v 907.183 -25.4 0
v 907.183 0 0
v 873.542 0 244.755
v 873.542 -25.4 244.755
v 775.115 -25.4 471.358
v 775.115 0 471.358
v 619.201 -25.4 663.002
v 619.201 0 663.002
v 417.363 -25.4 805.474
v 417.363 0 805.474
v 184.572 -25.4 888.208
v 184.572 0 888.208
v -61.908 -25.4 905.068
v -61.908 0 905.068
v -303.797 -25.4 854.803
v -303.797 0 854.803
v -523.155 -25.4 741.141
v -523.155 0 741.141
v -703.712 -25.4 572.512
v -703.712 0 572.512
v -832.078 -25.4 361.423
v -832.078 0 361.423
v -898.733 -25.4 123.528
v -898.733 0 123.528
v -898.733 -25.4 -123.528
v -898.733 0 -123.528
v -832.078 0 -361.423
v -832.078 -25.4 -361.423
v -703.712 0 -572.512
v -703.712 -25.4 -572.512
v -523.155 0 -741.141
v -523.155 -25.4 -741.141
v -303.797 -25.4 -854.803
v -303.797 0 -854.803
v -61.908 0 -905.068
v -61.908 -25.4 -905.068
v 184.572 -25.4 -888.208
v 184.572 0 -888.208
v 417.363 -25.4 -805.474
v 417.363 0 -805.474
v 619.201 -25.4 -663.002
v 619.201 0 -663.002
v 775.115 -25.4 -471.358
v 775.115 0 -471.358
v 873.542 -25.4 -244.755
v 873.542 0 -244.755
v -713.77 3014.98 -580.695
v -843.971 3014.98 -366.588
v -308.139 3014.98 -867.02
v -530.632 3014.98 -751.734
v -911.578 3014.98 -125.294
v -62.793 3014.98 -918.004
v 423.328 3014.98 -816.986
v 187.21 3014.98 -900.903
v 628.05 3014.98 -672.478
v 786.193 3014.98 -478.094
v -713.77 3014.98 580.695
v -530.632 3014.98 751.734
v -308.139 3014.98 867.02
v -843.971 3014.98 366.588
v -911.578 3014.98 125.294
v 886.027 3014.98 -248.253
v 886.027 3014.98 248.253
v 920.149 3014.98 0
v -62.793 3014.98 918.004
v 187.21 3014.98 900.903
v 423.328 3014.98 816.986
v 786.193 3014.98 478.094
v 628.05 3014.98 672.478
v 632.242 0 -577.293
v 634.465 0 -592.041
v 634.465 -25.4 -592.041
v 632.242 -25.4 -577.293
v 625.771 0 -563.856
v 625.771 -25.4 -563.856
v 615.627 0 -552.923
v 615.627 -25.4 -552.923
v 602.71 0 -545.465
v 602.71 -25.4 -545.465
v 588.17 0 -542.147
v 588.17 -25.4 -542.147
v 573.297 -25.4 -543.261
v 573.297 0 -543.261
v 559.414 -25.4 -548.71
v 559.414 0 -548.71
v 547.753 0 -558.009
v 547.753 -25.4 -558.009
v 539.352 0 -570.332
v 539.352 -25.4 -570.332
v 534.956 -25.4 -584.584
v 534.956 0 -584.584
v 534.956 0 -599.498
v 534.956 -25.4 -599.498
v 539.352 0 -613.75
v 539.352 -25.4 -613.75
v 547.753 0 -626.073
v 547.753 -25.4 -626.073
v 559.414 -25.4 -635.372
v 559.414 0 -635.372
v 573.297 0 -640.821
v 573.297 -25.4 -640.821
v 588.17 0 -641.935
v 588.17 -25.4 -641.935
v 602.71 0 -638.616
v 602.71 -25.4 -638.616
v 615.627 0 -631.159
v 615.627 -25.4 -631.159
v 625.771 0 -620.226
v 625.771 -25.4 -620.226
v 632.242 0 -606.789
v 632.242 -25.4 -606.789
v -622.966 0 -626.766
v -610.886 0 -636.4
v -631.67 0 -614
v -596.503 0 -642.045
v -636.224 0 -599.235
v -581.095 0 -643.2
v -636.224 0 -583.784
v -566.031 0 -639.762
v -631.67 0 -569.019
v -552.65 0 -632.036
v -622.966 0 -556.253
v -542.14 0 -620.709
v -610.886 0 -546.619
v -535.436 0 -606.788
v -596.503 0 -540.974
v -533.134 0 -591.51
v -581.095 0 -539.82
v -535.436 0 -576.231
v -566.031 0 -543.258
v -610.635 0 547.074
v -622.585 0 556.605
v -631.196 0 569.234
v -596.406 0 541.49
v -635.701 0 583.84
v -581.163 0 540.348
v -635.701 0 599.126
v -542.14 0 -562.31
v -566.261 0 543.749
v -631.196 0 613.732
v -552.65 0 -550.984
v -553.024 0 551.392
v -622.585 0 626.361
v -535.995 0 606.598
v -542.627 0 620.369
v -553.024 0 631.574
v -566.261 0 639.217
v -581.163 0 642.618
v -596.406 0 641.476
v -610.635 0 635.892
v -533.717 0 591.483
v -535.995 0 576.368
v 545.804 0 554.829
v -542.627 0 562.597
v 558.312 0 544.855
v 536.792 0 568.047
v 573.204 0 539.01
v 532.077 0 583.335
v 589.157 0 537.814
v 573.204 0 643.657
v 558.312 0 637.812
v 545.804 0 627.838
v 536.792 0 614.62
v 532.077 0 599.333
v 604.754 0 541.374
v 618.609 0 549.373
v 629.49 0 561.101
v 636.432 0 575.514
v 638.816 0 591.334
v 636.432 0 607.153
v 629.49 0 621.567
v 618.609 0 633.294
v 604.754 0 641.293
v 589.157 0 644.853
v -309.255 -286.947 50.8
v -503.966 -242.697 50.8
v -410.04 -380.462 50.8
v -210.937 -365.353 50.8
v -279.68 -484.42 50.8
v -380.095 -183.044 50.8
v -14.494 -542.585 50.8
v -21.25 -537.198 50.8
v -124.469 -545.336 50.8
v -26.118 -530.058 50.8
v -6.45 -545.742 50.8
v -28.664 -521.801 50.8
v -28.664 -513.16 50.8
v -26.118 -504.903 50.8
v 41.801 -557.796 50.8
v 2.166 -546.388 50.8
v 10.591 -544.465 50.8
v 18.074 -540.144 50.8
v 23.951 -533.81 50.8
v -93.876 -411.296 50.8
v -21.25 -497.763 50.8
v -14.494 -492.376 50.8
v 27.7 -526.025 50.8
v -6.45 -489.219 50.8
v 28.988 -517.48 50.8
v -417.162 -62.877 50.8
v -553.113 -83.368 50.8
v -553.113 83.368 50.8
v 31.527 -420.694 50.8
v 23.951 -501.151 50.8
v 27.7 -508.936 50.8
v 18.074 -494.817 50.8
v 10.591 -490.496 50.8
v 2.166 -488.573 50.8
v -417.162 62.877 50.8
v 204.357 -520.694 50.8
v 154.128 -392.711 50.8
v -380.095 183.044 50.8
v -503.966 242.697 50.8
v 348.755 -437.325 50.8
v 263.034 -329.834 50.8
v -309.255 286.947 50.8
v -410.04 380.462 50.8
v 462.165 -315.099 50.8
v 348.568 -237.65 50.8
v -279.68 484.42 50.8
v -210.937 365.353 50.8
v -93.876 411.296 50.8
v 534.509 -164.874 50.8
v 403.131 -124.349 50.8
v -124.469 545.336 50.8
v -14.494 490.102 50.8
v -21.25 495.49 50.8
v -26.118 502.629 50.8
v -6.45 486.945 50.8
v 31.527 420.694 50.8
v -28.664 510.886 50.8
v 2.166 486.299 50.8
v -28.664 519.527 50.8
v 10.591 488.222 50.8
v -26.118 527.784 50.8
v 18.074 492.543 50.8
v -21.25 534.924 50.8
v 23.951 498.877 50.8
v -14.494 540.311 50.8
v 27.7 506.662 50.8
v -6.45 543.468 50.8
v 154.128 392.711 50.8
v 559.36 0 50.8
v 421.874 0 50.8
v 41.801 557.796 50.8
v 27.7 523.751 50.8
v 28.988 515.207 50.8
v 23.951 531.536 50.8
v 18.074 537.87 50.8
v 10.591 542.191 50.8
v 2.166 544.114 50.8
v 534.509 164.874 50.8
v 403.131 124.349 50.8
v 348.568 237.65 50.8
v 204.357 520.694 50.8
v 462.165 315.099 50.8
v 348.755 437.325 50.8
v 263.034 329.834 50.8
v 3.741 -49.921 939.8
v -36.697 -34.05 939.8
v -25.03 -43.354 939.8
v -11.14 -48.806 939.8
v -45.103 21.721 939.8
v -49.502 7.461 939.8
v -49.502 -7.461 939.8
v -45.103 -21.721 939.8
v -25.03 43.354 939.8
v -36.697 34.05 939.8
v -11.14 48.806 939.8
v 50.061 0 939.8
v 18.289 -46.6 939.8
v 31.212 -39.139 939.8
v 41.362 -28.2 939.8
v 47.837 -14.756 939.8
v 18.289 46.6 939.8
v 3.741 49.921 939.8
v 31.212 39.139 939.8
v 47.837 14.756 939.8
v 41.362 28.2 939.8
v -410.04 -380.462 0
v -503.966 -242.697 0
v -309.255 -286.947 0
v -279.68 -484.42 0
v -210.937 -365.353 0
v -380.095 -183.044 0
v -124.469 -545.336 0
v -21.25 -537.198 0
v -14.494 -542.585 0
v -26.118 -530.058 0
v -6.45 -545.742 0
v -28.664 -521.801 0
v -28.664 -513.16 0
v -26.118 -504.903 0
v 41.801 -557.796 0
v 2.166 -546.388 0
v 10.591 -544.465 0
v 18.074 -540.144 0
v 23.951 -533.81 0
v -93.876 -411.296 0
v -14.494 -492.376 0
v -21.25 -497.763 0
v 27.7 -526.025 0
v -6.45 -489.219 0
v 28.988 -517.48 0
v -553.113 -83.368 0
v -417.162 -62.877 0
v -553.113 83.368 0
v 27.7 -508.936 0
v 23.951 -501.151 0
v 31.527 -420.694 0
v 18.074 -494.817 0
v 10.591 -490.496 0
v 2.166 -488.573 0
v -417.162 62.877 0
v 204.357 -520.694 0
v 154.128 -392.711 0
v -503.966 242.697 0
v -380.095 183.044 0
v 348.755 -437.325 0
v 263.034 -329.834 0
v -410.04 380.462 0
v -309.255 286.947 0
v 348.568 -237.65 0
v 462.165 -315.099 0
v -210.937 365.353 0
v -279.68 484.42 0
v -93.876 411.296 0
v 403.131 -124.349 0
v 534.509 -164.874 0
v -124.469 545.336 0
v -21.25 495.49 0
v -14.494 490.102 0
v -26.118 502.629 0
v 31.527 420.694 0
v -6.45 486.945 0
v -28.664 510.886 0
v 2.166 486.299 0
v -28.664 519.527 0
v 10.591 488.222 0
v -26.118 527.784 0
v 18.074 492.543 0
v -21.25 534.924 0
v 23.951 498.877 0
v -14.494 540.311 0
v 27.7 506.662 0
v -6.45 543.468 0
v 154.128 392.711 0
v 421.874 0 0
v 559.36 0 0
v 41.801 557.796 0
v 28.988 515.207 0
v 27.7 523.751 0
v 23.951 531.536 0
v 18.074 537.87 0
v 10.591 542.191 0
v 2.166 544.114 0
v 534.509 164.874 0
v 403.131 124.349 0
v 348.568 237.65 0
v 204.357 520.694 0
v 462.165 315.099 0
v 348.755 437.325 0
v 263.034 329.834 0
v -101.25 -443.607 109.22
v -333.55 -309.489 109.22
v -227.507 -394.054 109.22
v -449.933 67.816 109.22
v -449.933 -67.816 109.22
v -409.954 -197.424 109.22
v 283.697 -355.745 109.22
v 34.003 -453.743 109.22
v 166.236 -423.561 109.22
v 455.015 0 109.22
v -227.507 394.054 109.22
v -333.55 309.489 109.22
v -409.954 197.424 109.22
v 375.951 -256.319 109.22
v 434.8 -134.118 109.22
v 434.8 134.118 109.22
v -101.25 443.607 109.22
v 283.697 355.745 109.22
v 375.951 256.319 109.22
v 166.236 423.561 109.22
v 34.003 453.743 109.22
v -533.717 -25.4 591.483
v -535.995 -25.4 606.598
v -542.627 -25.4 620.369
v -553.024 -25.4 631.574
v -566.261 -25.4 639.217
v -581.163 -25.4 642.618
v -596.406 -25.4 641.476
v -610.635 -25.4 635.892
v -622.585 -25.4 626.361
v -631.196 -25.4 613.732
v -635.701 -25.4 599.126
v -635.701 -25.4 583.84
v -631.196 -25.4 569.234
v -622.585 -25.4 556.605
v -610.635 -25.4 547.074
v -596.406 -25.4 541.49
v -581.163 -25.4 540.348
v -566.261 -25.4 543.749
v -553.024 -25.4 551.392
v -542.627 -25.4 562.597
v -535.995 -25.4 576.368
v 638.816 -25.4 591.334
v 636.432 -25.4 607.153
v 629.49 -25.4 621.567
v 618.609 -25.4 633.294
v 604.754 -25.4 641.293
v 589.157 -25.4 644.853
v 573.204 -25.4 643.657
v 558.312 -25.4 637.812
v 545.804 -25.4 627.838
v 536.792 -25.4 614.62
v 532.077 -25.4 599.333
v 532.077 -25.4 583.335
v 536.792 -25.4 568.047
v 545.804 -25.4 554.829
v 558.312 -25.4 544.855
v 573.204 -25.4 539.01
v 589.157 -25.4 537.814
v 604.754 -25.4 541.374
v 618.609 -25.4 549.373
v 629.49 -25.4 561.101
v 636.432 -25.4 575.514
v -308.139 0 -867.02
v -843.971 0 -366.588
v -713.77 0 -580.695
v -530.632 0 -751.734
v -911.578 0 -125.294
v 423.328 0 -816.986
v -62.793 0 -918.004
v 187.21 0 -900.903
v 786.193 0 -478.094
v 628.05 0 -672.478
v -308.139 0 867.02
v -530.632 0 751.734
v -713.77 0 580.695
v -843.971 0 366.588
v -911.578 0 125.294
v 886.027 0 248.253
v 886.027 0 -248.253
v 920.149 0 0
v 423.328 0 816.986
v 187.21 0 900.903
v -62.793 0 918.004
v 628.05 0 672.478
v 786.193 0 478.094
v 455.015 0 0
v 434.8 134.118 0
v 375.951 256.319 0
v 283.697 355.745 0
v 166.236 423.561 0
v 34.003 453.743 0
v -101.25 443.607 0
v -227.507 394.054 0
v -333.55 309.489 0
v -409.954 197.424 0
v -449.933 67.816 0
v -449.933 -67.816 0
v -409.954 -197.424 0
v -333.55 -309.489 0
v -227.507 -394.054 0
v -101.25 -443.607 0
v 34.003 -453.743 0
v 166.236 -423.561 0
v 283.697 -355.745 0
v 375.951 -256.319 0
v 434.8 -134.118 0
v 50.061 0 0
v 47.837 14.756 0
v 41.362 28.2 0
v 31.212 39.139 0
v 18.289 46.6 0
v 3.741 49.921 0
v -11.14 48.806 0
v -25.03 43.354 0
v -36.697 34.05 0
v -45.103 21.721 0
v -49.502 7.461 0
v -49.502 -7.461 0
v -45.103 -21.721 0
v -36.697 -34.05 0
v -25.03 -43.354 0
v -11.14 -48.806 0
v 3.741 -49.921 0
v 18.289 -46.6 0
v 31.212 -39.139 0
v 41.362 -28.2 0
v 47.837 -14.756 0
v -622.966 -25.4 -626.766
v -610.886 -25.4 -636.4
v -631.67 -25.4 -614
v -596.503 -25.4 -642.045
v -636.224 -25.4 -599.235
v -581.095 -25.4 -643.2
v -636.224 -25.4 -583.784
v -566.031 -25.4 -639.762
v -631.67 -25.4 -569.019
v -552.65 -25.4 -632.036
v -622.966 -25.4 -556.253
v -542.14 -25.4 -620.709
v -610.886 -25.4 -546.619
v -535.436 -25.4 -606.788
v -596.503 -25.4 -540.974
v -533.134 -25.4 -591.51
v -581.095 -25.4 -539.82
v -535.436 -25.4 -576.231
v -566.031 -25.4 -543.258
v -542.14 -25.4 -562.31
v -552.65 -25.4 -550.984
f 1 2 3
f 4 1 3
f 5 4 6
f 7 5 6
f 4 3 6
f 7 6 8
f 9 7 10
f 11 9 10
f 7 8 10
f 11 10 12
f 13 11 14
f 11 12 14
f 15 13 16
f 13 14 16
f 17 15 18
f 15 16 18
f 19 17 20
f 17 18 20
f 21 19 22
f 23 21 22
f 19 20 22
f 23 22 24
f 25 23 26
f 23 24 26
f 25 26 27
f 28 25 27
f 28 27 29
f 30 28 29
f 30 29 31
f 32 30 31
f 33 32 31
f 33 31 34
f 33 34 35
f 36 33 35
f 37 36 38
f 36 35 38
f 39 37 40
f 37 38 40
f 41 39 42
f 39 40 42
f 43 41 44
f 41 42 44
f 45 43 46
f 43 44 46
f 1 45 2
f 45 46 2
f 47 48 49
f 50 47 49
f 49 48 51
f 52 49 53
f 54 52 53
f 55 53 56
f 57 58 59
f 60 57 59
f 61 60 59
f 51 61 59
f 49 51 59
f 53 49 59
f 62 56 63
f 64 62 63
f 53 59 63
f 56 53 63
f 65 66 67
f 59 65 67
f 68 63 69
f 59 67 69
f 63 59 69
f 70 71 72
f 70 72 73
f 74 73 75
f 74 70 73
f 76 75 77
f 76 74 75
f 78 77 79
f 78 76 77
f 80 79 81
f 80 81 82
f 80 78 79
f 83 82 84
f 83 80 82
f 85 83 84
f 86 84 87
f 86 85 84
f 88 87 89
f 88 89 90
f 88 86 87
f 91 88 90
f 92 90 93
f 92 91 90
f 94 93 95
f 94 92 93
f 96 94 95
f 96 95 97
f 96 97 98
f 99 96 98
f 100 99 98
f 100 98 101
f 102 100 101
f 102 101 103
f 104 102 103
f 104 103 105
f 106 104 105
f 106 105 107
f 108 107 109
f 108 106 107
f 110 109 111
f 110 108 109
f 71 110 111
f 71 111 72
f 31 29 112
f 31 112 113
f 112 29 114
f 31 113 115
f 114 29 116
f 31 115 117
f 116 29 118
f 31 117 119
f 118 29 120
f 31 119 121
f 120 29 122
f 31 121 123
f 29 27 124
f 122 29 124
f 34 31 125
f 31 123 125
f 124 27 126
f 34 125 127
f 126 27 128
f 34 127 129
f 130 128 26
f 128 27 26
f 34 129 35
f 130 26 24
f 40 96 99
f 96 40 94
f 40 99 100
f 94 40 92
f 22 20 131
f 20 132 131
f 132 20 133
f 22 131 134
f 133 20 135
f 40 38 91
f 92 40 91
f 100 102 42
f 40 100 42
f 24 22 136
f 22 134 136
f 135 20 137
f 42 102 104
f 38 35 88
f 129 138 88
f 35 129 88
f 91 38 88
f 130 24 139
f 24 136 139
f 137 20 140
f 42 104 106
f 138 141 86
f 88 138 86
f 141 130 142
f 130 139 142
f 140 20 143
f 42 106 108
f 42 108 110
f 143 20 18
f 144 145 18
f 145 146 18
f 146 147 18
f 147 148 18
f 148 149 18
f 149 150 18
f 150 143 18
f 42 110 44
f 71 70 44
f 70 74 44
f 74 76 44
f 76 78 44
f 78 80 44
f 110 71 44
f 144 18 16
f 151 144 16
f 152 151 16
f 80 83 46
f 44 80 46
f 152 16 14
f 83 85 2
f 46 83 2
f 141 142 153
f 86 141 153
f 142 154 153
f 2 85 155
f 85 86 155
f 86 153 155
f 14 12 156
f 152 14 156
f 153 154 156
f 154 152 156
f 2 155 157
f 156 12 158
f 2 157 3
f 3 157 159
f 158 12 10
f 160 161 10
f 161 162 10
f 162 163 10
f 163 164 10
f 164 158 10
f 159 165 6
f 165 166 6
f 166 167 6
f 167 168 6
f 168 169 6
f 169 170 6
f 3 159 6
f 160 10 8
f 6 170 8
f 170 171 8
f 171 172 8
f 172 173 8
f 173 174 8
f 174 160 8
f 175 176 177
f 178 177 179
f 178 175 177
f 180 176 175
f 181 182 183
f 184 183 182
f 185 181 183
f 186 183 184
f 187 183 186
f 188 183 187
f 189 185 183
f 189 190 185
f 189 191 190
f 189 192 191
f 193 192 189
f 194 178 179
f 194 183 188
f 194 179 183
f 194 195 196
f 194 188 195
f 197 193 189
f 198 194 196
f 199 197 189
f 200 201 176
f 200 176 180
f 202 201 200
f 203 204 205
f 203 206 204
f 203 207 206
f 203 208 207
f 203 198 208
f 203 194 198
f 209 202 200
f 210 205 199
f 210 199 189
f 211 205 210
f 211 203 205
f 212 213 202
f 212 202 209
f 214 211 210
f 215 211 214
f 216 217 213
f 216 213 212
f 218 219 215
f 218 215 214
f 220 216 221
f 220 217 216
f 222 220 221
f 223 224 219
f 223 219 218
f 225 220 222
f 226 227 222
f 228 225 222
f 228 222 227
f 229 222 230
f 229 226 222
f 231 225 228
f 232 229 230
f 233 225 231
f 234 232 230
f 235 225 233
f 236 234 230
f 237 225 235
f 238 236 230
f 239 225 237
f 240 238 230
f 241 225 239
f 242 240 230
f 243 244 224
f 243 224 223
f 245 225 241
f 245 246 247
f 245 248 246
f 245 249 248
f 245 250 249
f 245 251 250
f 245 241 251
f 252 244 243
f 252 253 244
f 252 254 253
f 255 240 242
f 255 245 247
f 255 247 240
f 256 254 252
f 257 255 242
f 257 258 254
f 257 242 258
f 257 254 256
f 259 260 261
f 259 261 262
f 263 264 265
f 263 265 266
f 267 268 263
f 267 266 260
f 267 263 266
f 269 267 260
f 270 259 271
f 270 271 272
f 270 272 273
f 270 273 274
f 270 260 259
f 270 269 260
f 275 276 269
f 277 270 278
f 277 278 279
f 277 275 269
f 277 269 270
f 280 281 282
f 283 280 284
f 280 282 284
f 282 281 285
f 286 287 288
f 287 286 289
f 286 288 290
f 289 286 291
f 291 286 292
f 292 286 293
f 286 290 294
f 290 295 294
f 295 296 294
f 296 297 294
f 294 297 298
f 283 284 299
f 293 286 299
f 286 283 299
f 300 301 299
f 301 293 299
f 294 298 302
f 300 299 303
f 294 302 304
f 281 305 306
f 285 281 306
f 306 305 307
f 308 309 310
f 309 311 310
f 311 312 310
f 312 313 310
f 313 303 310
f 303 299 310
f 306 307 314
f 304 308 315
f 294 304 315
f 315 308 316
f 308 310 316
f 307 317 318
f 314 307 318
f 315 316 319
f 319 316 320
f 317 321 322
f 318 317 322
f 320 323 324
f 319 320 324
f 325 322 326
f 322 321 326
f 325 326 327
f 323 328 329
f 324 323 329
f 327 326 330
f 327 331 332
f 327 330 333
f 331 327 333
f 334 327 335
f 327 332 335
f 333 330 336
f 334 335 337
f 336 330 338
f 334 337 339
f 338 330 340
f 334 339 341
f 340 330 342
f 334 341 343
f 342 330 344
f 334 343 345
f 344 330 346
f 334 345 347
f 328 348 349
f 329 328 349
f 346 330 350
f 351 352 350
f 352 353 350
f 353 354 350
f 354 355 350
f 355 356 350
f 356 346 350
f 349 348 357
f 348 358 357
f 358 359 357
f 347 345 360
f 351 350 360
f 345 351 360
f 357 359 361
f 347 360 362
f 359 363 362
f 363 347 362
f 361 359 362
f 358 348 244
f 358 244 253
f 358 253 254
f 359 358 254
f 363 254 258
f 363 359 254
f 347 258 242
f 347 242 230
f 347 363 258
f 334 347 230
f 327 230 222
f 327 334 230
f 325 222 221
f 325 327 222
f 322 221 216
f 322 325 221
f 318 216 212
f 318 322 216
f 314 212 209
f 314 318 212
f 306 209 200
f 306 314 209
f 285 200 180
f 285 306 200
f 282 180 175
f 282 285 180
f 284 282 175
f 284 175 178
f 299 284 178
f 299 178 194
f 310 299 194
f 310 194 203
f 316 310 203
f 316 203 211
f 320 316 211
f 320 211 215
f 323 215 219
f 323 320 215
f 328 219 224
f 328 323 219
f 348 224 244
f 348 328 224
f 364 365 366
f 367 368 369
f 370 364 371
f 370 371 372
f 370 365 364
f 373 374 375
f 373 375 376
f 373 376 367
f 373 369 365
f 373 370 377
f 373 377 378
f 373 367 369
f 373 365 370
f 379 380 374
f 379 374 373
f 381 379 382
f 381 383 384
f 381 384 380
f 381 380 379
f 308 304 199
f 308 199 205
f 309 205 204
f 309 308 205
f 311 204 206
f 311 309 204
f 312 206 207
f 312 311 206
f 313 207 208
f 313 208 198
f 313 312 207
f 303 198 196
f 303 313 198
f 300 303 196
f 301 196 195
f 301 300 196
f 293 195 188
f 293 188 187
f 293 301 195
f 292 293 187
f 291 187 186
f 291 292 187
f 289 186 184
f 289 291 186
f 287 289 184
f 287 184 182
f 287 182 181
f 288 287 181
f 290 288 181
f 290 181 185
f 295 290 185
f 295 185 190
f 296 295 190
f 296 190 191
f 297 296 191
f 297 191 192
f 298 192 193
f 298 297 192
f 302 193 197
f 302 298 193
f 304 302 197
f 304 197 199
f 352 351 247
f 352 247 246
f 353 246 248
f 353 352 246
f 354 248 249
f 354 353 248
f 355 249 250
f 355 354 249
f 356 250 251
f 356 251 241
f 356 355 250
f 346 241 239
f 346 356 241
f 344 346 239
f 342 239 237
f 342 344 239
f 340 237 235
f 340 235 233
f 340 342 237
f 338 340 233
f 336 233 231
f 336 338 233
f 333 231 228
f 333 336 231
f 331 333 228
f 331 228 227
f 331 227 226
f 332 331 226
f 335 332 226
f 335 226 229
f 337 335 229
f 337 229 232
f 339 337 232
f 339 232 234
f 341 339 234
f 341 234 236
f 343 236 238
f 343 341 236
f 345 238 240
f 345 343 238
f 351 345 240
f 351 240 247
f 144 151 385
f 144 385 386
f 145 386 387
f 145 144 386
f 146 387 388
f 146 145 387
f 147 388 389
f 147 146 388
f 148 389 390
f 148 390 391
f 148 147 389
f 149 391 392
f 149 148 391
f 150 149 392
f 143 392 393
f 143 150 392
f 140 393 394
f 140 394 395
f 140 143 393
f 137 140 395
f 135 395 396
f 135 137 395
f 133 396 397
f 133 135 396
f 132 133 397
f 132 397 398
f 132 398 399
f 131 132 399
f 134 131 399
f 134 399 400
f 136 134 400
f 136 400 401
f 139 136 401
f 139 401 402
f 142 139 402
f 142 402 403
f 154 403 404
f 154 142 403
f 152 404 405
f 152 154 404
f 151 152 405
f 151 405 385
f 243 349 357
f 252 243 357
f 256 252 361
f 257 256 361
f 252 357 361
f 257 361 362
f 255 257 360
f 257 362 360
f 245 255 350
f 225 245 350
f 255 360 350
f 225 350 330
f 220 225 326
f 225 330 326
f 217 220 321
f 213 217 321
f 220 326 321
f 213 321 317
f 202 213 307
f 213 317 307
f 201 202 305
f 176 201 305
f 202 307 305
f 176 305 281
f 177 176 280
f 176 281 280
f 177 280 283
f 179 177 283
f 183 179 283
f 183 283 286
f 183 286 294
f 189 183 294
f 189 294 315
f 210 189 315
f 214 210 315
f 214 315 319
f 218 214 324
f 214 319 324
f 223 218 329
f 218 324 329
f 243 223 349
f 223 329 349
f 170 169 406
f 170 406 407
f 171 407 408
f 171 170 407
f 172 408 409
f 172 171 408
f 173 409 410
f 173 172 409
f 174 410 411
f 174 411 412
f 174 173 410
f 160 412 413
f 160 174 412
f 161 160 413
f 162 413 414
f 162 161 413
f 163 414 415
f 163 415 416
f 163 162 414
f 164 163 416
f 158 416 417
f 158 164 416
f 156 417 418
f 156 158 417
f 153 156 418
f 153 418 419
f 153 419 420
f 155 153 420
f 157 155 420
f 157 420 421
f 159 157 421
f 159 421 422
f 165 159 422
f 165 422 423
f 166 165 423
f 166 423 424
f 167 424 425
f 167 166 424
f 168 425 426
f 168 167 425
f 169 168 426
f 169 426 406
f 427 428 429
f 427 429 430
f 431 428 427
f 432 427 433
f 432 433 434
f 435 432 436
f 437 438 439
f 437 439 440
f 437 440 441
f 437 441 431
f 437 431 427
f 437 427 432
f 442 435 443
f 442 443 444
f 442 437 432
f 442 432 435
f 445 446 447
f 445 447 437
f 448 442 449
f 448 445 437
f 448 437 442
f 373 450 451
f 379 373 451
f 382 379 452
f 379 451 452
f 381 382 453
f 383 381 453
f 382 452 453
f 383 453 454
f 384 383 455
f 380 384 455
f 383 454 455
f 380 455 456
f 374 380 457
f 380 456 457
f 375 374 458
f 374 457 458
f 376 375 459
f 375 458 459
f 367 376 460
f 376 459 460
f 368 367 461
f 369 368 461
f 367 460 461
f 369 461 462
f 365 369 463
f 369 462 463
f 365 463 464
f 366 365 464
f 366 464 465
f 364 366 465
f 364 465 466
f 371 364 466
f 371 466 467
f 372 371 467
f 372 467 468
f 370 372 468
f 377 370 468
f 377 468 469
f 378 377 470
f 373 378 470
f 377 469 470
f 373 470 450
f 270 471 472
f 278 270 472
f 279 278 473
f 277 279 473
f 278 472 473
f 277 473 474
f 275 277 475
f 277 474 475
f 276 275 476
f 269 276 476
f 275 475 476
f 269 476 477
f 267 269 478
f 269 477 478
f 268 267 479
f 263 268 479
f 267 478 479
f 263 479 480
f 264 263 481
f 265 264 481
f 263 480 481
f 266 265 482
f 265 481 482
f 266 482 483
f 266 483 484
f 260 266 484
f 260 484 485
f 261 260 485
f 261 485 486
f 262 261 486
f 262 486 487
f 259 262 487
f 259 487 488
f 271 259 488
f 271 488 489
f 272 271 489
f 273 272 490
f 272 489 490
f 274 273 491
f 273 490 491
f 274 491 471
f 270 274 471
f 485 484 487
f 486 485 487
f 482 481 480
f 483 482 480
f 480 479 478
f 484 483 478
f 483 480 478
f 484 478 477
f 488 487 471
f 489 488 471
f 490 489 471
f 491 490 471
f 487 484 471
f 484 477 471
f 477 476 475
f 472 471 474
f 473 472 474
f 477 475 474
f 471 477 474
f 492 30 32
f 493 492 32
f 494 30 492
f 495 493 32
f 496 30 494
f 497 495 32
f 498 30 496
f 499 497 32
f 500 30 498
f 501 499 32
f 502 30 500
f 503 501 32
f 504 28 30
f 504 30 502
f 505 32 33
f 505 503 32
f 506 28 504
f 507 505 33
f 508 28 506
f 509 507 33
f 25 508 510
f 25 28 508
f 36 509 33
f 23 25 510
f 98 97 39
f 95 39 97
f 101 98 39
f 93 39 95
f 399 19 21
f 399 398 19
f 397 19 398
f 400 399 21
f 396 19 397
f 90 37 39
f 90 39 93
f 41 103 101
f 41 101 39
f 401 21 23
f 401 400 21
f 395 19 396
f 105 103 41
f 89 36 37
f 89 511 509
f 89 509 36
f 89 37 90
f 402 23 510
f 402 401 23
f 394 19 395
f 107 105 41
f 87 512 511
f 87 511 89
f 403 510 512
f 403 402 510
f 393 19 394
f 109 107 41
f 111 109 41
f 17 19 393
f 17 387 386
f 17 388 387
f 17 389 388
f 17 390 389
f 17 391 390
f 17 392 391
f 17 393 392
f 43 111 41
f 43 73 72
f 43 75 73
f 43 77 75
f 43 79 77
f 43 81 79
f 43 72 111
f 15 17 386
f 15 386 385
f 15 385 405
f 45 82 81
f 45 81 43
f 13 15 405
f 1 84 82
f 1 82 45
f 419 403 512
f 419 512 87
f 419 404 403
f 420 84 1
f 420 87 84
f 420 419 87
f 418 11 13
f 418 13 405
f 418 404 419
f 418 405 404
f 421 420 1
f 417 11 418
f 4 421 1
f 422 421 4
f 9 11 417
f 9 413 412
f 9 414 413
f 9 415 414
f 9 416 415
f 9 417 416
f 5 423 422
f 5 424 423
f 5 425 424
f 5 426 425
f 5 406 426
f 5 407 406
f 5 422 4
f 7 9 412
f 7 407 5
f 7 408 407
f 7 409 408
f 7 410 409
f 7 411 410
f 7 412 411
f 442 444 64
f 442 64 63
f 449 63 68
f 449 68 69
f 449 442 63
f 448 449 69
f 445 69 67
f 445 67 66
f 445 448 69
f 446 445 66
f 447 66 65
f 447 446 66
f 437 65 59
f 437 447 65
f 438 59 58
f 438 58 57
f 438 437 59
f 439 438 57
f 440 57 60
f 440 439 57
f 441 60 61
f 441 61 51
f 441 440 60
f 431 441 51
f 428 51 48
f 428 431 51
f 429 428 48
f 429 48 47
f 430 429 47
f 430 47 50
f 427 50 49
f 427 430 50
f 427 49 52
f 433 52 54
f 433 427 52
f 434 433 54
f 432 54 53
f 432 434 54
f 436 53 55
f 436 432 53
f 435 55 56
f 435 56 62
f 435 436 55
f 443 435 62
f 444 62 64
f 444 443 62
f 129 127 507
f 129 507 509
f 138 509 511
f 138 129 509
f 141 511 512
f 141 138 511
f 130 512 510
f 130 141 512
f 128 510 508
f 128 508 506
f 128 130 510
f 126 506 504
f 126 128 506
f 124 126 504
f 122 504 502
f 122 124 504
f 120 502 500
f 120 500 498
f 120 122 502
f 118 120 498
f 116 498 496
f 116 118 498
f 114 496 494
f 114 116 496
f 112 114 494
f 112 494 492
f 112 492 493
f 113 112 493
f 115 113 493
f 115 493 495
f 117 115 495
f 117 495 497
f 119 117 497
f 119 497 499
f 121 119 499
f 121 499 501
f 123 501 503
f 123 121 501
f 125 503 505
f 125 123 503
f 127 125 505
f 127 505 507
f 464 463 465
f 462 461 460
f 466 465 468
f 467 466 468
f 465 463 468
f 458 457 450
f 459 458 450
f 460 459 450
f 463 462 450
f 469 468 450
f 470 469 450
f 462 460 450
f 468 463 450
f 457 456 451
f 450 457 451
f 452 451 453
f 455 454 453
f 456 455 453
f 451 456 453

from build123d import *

# Parameters (mm, degrees)
F0_R      = 920.1486376433
F1_DEPTH  = 3014.98
F2_R      = 559.3601435022
F2_R_2    = 28.9882466608
F2_R_3    = 421.8736491985
F3_DEPTH  = 50.8
F4_R      = 455.014896114
F6_DEPTH  = 109.22
F7_R      = 907.1829468917
F7_R_2    = 51.8349054872
F7_R_3    = 50.0342377905
F7_R_4    = 51.2787041201
F7_R_5    = 53.6692639751
F8_DEPTH  = 25.4
F9_R      = 50.0607336969
F10_DEPTH = 939.8


# Not quite as in the source:
# - the program builds the solid bodies; features that only make, move or delete a surface that nothing else refers to are left out


with BuildPart() as f1:
    # F0 (on Front) → F1 (new body)
    with BuildSketch(Plane.XZ):
        Circle(F0_R)
    extrude(amount=-F1_DEPTH)


with BuildPart() as f3:
    # F2 (on Top) → F3 (new body)
    with BuildSketch(Plane.XY):
        Circle(F2_R)
        with Locations((0, -517.4804925919)):
            Circle(F2_R_2, mode=Mode.SUBTRACT)
        Circle(F2_R_3, mode=Mode.SUBTRACT)
        with Locations((0, 515.2065753937)):
            Circle(F2_R_2, mode=Mode.SUBTRACT)
    extrude(amount=F3_DEPTH)


with BuildPart() as f6:
    # F4 (on Top) → F6 (new body)
    with BuildSketch(Plane.XY):
        Circle(F4_R)
    extrude(amount=F6_DEPTH)


with BuildPart() as f8:
    # F7 (on Front) → F8 (new body)
    with BuildSketch(Plane.XZ):
        Circle(F7_R)
        with Locations((-584.9684993263, -591.5097674587)):
            Circle(F7_R_2, mode=Mode.SUBTRACT)
        with Locations((584.4309362264, -592.0409031348)):
            Circle(F7_R_3, mode=Mode.SUBTRACT)
        with Locations((-584.9954457836, 591.4831177773)):
            Circle(F7_R_4, mode=Mode.SUBTRACT)
        with Locations((585.1466364716, 591.3335471873)):
            Circle(F7_R_5, mode=Mode.SUBTRACT)
    extrude(amount=F8_DEPTH)


with BuildPart() as f10:
    # F9 (on Top) → F10 (new body)
    with BuildSketch(Plane.XY):
        Circle(F9_R)
    extrude(amount=F10_DEPTH)


solid = Compound([f1.part, f3.part, f6.part, f8.part, f10.part])
